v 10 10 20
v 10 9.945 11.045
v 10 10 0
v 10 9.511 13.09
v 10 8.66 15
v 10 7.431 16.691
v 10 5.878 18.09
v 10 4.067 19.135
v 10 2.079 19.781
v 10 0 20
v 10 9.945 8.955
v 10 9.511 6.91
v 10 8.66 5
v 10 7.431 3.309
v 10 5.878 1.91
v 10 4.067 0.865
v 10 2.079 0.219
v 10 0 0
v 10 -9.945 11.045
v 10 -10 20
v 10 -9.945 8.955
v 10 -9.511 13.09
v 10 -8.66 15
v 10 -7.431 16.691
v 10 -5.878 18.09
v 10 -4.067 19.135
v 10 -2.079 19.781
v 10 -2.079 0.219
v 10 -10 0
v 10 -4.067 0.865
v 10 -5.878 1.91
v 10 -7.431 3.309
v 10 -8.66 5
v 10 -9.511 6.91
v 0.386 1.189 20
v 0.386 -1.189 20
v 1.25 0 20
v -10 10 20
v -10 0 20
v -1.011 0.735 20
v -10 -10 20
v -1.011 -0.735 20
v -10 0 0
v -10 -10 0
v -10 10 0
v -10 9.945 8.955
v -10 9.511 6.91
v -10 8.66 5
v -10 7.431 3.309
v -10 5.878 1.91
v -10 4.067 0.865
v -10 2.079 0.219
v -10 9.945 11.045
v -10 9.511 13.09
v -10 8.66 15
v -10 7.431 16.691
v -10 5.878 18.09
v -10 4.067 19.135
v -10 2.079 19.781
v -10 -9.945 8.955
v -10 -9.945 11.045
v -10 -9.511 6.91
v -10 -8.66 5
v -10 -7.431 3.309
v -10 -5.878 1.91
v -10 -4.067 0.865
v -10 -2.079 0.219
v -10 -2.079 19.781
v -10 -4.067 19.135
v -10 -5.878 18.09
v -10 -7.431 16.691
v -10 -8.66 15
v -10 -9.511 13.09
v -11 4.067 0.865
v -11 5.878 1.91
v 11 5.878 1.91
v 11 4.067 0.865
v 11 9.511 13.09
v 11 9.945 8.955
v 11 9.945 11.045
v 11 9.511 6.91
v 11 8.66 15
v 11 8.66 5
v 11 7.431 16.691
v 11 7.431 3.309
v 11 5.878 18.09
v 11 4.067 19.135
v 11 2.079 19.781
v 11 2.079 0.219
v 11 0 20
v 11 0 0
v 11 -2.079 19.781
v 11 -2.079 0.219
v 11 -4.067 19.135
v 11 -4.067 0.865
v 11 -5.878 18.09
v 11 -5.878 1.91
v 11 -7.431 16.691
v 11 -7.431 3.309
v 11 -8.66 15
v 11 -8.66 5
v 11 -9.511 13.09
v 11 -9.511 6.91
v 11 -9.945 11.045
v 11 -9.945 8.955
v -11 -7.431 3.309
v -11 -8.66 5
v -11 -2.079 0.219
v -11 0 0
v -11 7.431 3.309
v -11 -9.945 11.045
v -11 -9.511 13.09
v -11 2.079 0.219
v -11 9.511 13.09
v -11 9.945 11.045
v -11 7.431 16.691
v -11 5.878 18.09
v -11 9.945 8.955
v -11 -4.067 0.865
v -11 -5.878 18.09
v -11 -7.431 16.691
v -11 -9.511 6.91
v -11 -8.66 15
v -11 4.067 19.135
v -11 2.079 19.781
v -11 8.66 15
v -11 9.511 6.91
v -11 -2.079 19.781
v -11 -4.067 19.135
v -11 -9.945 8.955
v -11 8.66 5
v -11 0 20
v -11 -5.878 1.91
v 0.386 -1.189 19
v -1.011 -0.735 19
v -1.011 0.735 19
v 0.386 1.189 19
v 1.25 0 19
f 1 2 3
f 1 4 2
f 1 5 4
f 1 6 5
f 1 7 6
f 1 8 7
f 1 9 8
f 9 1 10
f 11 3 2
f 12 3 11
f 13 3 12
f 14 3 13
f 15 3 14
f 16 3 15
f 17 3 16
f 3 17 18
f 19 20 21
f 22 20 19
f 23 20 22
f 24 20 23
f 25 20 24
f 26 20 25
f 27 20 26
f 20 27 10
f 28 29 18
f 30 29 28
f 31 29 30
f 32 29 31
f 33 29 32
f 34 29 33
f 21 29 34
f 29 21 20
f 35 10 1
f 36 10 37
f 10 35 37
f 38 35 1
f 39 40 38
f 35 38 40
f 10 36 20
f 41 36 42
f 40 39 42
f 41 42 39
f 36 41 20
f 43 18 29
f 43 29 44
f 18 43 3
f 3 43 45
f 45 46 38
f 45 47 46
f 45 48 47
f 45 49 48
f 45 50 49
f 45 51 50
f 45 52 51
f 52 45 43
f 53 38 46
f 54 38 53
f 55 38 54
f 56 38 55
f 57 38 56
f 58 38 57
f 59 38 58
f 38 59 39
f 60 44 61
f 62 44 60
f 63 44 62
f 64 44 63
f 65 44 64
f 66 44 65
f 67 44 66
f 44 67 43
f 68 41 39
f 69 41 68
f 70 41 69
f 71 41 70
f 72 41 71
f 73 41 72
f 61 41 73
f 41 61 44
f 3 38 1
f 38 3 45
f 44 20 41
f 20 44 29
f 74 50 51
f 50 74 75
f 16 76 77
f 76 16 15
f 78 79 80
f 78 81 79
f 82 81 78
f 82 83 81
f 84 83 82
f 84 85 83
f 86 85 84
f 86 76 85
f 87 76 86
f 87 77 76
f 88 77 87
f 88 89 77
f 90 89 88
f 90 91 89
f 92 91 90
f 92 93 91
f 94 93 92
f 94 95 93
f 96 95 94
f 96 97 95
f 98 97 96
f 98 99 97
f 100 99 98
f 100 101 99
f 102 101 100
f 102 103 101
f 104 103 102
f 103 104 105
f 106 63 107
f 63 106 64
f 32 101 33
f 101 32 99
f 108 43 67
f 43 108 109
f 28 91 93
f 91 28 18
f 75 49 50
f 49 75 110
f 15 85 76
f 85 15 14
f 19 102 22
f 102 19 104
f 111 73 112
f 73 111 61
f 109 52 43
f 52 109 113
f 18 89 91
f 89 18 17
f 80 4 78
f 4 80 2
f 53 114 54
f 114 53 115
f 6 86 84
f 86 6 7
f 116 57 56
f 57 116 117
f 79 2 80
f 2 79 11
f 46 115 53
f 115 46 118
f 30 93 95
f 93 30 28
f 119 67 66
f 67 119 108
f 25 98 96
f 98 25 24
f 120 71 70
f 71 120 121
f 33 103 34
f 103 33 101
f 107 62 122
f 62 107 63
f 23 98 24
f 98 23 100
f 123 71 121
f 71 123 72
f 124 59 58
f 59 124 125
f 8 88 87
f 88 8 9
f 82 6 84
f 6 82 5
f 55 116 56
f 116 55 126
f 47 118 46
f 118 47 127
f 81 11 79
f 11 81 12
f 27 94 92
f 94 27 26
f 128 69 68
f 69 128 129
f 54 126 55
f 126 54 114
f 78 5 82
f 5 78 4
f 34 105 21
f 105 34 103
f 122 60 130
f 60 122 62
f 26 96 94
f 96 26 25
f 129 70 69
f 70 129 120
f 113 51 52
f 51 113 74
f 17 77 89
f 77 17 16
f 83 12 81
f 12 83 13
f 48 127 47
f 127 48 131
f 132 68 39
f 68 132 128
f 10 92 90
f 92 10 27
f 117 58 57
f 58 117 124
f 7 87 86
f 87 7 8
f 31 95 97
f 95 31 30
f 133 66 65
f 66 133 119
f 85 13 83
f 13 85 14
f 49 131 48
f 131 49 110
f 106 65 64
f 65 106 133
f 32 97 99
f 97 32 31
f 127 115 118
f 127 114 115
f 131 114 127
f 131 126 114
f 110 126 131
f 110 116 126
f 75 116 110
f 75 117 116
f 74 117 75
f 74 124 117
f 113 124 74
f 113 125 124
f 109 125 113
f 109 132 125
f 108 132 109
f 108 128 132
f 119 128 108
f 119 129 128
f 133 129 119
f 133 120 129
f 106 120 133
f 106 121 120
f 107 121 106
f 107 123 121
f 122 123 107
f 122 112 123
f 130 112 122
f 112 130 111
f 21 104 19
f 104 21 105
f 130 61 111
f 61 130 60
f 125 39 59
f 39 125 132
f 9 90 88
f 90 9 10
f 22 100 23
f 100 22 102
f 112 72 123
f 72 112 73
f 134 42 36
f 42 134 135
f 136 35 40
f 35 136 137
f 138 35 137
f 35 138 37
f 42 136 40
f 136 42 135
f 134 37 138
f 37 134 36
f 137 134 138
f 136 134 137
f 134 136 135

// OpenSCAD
cube_size = 20; // [10:Small,20:Medium,30:Large,4:mini]

hole_diameter = 2.5;
hole_radius = hole_diameter/2;

// How deep should the center hole be?
hole_depth = 1; // [0,1,5,50]

show_wheels = "yes"; // [yes,no]

// How thick should the side wheels be?
wheel_thickness = 1; // [1:40]

// ignore this variable!
// foo=1;

// don't turn functions into params!
function BEZ03(u) = pow((1-u), 3);

// ignore variable values
bing = 3+4;
baz = 3 / hole_depth;

difference() {
  union() {
    translate([0, 0, cube_size/2]) cube([cube_size,cube_size,cube_size], center=true);
    if (show_wheels == "yes") {
      translate([0, 0, cube_size/2]) rotate([0, 90, 0]) {
        cylinder(r=cube_size/2, h=cube_size+(wheel_thickness*2), center=true);
      }
    }
  }
  translate([0, 0, cube_size-hole_depth]) cylinder(r=hole_radius, h=hole_depth);
}          
        
